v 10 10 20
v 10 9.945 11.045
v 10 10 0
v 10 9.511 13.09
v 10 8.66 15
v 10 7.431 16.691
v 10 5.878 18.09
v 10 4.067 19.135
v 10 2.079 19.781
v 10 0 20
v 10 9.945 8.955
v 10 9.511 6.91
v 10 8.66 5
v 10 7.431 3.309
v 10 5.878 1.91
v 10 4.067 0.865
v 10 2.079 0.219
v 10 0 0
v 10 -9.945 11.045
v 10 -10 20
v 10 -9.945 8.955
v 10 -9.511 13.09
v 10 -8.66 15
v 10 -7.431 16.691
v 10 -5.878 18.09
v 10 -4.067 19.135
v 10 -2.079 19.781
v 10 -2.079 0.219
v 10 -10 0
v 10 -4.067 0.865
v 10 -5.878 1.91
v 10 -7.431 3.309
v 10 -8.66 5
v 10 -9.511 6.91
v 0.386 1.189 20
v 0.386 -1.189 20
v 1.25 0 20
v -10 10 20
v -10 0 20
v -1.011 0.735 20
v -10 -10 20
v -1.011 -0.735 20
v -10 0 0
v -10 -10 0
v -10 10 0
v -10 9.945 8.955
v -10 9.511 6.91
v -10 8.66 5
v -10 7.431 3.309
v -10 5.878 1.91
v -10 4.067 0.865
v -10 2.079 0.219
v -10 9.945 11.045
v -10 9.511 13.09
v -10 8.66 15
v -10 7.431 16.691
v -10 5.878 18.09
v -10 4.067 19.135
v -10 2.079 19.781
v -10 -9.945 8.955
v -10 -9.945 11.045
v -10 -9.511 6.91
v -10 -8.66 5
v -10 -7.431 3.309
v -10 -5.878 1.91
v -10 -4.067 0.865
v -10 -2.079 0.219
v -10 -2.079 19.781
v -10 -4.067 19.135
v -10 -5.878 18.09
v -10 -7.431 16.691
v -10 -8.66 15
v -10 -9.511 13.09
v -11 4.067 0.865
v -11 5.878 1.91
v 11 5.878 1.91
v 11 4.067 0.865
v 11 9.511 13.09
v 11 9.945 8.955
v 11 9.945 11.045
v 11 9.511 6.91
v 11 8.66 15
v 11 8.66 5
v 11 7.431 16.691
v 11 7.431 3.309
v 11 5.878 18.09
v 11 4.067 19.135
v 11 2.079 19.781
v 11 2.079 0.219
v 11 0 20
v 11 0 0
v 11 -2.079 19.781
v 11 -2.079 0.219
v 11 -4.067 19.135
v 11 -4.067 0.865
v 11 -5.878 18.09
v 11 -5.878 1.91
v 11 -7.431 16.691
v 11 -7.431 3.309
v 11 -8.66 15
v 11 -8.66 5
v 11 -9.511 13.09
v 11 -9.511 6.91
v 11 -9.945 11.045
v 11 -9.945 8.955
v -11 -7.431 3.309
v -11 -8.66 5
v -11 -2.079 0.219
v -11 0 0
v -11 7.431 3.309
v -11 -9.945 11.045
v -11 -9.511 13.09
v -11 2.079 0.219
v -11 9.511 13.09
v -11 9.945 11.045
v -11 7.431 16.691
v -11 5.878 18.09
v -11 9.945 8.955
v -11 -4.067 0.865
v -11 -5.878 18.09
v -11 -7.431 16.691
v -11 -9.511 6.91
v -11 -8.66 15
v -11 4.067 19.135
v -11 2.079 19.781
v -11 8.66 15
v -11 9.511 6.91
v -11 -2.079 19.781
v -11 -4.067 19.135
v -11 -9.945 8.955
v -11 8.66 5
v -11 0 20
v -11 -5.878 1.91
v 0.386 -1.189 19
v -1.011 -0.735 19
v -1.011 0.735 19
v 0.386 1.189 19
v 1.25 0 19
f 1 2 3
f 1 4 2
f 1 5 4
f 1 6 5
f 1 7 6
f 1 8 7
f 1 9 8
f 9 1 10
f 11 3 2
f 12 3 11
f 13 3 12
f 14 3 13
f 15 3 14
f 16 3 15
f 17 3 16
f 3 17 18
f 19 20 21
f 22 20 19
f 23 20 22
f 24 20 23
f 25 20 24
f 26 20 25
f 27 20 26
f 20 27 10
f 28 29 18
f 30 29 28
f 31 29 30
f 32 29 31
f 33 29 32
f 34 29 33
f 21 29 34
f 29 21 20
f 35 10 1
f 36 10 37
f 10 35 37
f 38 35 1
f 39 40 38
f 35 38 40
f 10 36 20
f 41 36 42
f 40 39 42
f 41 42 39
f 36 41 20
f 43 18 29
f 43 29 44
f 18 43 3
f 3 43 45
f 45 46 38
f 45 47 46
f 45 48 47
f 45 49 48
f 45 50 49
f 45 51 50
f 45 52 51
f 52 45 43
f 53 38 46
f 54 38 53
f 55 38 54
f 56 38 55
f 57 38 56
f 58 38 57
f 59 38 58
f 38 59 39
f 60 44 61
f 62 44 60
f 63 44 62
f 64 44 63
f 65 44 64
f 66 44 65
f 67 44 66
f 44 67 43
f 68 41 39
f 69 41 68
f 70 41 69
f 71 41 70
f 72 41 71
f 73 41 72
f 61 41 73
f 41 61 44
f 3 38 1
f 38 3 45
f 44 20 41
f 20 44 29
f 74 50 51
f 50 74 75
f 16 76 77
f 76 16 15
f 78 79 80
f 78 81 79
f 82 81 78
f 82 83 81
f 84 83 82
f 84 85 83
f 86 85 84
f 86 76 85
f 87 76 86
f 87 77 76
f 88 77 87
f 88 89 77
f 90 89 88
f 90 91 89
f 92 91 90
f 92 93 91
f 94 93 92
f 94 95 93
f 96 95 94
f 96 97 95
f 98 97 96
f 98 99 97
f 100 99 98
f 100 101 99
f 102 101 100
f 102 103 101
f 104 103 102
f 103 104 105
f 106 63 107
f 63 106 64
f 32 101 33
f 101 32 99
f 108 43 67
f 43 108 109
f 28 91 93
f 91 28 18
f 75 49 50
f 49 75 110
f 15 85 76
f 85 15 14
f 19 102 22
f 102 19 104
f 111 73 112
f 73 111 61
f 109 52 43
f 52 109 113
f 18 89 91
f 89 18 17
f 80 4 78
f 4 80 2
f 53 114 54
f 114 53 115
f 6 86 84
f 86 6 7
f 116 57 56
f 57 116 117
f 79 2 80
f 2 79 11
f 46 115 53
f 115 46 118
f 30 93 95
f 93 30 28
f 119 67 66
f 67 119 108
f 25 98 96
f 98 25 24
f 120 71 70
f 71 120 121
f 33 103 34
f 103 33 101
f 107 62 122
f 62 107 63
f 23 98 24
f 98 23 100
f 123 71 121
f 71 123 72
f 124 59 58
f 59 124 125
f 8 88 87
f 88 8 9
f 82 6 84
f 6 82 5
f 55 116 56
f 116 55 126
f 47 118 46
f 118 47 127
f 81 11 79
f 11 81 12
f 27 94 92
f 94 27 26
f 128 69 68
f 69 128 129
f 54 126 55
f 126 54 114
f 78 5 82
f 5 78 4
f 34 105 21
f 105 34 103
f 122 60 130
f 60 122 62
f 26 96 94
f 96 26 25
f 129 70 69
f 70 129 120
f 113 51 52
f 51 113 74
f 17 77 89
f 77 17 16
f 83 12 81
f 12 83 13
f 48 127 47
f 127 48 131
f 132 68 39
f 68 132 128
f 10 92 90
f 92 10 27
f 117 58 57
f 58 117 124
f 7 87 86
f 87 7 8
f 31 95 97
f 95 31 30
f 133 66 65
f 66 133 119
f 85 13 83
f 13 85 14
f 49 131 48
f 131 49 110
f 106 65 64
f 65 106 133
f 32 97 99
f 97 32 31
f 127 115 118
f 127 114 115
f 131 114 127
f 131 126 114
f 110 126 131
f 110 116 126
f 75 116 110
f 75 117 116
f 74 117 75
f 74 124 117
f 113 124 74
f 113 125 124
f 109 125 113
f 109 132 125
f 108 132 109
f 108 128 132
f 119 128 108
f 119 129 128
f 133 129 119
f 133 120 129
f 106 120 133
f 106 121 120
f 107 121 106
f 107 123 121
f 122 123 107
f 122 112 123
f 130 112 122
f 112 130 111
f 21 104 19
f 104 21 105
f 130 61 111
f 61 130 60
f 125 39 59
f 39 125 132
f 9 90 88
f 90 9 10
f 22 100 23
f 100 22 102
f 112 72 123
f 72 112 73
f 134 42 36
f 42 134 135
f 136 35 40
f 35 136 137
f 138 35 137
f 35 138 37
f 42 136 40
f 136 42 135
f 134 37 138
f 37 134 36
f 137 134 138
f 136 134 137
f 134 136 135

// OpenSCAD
cube_size = 20; // [10:Small,20:Medium,30:Large,4:mini]

hole_diameter = 2.5;
hole_radius = hole_diameter/2;

// How deep should the center hole be?
hole_depth = 1; // [0,1,5,50]

show_wheels = "yes"; // [yes,no]

// How thick should the side wheels be?
wheel_thickness = 1; // [1:40]

// ignore this variable!
// foo=1;

// don't turn functions into params!
function BEZ03(u) = pow((1-u), 3);

// ignore variable values
bing = 3+4;
baz = 3 / hole_depth;

difference() {
  union() {
    translate([0, 0, cube_size/2]) cube([cube_size,cube_size,cube_size], center=true);
    if (show_wheels == "yes") {
      translate([0, 0, cube_size/2]) rotate([0, 90, 0]) {
        cylinder(r=cube_size/2, h=cube_size+(wheel_thickness*2), center=true);
      }
    }
  }
  translate([0, 0, cube_size-hole_depth]) cylinder(r=hole_radius, h=hole_depth);
}          
        
